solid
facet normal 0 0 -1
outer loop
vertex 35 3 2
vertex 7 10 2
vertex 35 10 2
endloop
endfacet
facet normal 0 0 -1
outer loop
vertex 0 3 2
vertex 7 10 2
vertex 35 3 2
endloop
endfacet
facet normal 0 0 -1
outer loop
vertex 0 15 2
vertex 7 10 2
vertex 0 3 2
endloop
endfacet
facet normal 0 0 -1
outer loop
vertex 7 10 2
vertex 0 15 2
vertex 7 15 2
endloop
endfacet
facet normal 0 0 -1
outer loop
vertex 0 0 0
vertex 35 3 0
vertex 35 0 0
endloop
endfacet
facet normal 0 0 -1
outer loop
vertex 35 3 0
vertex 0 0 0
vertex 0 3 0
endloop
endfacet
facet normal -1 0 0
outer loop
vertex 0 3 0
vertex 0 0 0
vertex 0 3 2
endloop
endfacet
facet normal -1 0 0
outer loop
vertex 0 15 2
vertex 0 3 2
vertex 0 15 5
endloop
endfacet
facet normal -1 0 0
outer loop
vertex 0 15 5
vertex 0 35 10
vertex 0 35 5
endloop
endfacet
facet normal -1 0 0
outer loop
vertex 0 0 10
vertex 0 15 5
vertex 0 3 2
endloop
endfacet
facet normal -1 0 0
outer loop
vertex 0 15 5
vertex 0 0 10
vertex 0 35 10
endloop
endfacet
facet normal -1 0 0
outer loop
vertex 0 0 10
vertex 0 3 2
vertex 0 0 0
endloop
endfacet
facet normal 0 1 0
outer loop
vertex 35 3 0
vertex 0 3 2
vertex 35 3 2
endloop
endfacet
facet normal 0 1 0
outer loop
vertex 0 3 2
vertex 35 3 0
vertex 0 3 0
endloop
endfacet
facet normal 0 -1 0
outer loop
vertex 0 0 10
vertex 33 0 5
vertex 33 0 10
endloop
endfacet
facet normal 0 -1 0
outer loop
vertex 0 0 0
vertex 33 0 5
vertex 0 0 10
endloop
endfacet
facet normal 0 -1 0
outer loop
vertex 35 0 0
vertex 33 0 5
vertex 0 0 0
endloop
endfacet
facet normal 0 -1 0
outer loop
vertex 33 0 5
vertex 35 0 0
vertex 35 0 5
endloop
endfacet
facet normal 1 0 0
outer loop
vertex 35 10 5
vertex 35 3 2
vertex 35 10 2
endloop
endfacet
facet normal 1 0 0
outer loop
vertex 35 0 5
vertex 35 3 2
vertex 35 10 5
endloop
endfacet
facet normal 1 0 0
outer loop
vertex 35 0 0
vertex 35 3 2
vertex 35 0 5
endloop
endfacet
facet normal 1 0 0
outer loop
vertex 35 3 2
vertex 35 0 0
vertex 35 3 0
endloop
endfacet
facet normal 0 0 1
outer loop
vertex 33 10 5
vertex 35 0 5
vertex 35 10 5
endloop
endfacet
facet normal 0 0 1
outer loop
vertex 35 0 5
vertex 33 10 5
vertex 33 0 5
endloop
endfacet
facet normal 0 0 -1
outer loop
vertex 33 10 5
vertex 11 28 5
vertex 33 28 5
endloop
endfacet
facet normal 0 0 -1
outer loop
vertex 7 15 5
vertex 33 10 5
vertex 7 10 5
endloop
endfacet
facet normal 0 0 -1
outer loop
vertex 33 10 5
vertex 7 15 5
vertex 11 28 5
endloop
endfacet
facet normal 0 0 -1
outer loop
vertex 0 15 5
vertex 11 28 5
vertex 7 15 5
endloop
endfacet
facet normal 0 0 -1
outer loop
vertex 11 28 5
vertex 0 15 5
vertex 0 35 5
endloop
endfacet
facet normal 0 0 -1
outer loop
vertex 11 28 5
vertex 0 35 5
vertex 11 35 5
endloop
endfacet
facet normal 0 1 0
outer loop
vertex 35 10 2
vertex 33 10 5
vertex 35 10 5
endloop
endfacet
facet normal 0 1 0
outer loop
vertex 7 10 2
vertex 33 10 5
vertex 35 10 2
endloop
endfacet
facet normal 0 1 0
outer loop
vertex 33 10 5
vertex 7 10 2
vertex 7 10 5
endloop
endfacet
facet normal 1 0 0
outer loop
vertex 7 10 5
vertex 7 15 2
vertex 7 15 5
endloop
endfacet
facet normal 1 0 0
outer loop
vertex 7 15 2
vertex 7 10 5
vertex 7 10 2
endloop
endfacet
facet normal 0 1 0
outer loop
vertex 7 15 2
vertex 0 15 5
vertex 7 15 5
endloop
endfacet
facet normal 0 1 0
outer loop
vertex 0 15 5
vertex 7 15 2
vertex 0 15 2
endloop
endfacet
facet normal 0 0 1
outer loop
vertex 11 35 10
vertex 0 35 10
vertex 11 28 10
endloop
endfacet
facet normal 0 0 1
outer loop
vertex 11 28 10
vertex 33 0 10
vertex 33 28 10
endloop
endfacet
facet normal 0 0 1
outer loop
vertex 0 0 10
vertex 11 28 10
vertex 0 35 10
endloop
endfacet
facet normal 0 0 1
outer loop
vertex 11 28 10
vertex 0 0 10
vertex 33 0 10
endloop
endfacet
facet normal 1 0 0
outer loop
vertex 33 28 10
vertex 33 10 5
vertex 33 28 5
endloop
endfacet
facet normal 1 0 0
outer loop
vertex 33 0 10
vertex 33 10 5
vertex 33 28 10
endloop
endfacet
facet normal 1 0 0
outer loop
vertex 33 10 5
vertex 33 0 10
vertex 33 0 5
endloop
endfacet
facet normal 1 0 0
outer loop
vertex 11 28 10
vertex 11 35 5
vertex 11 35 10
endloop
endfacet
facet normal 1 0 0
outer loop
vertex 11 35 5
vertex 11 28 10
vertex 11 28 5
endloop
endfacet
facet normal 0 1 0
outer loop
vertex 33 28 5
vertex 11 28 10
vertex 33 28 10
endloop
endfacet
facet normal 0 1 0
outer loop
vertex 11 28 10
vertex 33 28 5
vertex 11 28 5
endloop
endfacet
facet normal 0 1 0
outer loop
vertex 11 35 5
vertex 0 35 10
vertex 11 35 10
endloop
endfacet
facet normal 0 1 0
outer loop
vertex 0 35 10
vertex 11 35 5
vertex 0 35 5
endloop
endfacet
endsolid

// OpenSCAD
translate([2.5, 1.5, 1.0]) color([0.7922364716417103, 0.30560393283991993, 0.33989040641624346]) cube([5, 3, 2], center=true);
translate([7.5, 1.5, 1.0]) color([0.5301854376454147, 0.24904704757555507, 0.9199780878573697]) cube([5, 3, 2], center=true);
translate([12.5, 1.5, 1.0]) color([0.1635547583408129, 0.41483040050373277, 0.2896919495072058]) cube([5, 3, 2], center=true);
translate([17.5, 1.5, 1.0]) color([0.5198341022016146, 0.5739818030823766, 0.6271396891048426]) cube([5, 3, 2], center=true);
translate([22.5, 1.5, 1.0]) color([0.5313758038379728, 0.4108045023355995, 0.634594012376466]) cube([5, 3, 2], center=true);
translate([27.5, 1.5, 1.0]) color([0.40341287658681757, 0.7785502590540477, 0.7881774252549901]) cube([5, 3, 2], center=true);
translate([32.5, 1.5, 1.0]) color([0.29225416811082217, 0.37180432355577453, 0.6288109059468862]) cube([5, 3, 2], center=true);
translate([3.5, 2.5, 3.5]) color([0.15706996711565713, 0.6970319309869248, 0.3814277529807131]) cube([7, 5, 3], center=true);
translate([10.5, 2.5, 3.5]) color([0.591062474757007, 0.1395330992312218, 0.6682583860975598]) cube([7, 5, 3], center=true);
translate([17.5, 2.5, 3.5]) color([0.3540578606136997, 0.4726655762072315, 0.4151074008495357]) cube([7, 5, 3], center=true);
translate([24.5, 2.5, 3.5]) color([0.47671524799509457, 0.6946956329164442, 0.31824017683207795]) cube([7, 5, 3], center=true);
translate([31.5, 2.5, 3.5]) color([0.6520544808985483, 0.060222107499701916, 0.3001851524622099]) cube([7, 5, 3], center=true);
translate([3.5, 7.5, 3.5]) color([0.7452096901500458, 0.05240587806206365, 0.6211421952822352]) cube([7, 5, 3], center=true);
translate([10.5, 7.5, 3.5]) color([0.025546799267838538, 0.4715288683099005, 0.8885450437134765]) cube([7, 5, 3], center=true);
translate([17.5, 7.5, 3.5]) color([0.010110093997603875, 0.5268280206539229, 0.06645682965886301]) cube([7, 5, 3], center=true);
translate([24.5, 7.5, 3.5]) color([0.8671097761494883, 0.6862965222396646, 0.7419538566814291]) cube([7, 5, 3], center=true);
translate([31.5, 7.5, 3.5]) color([0.669007579945888, 0.006423453698145676, 0.041177862257898545]) cube([7, 5, 3], center=true);
translate([3.5, 12.5, 3.5]) color([0.6208768040220466, 0.9996851255769114, 0.8731472390917929]) cube([7, 5, 3], center=true);
translate([5.5, 3.5, 7.5]) color([0.699685806725371, 0.7270999543422898, 0.2266870226016624]) cube([11, 7, 5], center=true);
translate([16.5, 3.5, 7.5]) color([0.751613934135812, 0.28792410486343756, 0.10546026702239297]) cube([11, 7, 5], center=true);
translate([27.5, 3.5, 7.5]) color([0.4608948954667579, 0.33019577252961807, 0.168255398651179]) cube([11, 7, 5], center=true);
translate([5.5, 10.5, 7.5]) color([0.42170989251140467, 0.8972009769638755, 0.4352702732981688]) cube([11, 7, 5], center=true);
translate([16.5, 10.5, 7.5]) color([0.4472918952497248, 0.708827757444238, 0.5241618701522923]) cube([11, 7, 5], center=true);
translate([27.5, 10.5, 7.5]) color([0.12922303534199353, 0.91039239754397, 0.4441243361619651]) cube([11, 7, 5], center=true);
translate([5.5, 17.5, 7.5]) color([0.7893377392253591, 0.38887513002224416, 0.806846018820692]) cube([11, 7, 5], center=true);
translate([16.5, 17.5, 7.5]) color([0.3895364160074527, 0.2201595216660458, 0.19619466691666865]) cube([11, 7, 5], center=true);
translate([27.5, 17.5, 7.5]) color([0.9400346443375104, 0.58653025858102, 0.04979326505826487]) cube([11, 7, 5], center=true);
translate([5.5, 24.5, 7.5]) color([0.38834759617804915, 0.234029260524927, 0.08465706460929934]) cube([11, 7, 5], center=true);
translate([16.5, 24.5, 7.5]) color([0.18675586852140846, 0.05699047999950346, 0.6380736282281027]) cube([11, 7, 5], center=true);
translate([27.5, 24.5, 7.5]) color([0.17337386483746886, 0.6107798762435255, 0.6125067478912297]) cube([11, 7, 5], center=true);
translate([5.5, 31.5, 7.5]) color([0.7049237107399368, 0.5121186506114312, 0.28442399033479826]) cube([11, 7, 5], center=true);
